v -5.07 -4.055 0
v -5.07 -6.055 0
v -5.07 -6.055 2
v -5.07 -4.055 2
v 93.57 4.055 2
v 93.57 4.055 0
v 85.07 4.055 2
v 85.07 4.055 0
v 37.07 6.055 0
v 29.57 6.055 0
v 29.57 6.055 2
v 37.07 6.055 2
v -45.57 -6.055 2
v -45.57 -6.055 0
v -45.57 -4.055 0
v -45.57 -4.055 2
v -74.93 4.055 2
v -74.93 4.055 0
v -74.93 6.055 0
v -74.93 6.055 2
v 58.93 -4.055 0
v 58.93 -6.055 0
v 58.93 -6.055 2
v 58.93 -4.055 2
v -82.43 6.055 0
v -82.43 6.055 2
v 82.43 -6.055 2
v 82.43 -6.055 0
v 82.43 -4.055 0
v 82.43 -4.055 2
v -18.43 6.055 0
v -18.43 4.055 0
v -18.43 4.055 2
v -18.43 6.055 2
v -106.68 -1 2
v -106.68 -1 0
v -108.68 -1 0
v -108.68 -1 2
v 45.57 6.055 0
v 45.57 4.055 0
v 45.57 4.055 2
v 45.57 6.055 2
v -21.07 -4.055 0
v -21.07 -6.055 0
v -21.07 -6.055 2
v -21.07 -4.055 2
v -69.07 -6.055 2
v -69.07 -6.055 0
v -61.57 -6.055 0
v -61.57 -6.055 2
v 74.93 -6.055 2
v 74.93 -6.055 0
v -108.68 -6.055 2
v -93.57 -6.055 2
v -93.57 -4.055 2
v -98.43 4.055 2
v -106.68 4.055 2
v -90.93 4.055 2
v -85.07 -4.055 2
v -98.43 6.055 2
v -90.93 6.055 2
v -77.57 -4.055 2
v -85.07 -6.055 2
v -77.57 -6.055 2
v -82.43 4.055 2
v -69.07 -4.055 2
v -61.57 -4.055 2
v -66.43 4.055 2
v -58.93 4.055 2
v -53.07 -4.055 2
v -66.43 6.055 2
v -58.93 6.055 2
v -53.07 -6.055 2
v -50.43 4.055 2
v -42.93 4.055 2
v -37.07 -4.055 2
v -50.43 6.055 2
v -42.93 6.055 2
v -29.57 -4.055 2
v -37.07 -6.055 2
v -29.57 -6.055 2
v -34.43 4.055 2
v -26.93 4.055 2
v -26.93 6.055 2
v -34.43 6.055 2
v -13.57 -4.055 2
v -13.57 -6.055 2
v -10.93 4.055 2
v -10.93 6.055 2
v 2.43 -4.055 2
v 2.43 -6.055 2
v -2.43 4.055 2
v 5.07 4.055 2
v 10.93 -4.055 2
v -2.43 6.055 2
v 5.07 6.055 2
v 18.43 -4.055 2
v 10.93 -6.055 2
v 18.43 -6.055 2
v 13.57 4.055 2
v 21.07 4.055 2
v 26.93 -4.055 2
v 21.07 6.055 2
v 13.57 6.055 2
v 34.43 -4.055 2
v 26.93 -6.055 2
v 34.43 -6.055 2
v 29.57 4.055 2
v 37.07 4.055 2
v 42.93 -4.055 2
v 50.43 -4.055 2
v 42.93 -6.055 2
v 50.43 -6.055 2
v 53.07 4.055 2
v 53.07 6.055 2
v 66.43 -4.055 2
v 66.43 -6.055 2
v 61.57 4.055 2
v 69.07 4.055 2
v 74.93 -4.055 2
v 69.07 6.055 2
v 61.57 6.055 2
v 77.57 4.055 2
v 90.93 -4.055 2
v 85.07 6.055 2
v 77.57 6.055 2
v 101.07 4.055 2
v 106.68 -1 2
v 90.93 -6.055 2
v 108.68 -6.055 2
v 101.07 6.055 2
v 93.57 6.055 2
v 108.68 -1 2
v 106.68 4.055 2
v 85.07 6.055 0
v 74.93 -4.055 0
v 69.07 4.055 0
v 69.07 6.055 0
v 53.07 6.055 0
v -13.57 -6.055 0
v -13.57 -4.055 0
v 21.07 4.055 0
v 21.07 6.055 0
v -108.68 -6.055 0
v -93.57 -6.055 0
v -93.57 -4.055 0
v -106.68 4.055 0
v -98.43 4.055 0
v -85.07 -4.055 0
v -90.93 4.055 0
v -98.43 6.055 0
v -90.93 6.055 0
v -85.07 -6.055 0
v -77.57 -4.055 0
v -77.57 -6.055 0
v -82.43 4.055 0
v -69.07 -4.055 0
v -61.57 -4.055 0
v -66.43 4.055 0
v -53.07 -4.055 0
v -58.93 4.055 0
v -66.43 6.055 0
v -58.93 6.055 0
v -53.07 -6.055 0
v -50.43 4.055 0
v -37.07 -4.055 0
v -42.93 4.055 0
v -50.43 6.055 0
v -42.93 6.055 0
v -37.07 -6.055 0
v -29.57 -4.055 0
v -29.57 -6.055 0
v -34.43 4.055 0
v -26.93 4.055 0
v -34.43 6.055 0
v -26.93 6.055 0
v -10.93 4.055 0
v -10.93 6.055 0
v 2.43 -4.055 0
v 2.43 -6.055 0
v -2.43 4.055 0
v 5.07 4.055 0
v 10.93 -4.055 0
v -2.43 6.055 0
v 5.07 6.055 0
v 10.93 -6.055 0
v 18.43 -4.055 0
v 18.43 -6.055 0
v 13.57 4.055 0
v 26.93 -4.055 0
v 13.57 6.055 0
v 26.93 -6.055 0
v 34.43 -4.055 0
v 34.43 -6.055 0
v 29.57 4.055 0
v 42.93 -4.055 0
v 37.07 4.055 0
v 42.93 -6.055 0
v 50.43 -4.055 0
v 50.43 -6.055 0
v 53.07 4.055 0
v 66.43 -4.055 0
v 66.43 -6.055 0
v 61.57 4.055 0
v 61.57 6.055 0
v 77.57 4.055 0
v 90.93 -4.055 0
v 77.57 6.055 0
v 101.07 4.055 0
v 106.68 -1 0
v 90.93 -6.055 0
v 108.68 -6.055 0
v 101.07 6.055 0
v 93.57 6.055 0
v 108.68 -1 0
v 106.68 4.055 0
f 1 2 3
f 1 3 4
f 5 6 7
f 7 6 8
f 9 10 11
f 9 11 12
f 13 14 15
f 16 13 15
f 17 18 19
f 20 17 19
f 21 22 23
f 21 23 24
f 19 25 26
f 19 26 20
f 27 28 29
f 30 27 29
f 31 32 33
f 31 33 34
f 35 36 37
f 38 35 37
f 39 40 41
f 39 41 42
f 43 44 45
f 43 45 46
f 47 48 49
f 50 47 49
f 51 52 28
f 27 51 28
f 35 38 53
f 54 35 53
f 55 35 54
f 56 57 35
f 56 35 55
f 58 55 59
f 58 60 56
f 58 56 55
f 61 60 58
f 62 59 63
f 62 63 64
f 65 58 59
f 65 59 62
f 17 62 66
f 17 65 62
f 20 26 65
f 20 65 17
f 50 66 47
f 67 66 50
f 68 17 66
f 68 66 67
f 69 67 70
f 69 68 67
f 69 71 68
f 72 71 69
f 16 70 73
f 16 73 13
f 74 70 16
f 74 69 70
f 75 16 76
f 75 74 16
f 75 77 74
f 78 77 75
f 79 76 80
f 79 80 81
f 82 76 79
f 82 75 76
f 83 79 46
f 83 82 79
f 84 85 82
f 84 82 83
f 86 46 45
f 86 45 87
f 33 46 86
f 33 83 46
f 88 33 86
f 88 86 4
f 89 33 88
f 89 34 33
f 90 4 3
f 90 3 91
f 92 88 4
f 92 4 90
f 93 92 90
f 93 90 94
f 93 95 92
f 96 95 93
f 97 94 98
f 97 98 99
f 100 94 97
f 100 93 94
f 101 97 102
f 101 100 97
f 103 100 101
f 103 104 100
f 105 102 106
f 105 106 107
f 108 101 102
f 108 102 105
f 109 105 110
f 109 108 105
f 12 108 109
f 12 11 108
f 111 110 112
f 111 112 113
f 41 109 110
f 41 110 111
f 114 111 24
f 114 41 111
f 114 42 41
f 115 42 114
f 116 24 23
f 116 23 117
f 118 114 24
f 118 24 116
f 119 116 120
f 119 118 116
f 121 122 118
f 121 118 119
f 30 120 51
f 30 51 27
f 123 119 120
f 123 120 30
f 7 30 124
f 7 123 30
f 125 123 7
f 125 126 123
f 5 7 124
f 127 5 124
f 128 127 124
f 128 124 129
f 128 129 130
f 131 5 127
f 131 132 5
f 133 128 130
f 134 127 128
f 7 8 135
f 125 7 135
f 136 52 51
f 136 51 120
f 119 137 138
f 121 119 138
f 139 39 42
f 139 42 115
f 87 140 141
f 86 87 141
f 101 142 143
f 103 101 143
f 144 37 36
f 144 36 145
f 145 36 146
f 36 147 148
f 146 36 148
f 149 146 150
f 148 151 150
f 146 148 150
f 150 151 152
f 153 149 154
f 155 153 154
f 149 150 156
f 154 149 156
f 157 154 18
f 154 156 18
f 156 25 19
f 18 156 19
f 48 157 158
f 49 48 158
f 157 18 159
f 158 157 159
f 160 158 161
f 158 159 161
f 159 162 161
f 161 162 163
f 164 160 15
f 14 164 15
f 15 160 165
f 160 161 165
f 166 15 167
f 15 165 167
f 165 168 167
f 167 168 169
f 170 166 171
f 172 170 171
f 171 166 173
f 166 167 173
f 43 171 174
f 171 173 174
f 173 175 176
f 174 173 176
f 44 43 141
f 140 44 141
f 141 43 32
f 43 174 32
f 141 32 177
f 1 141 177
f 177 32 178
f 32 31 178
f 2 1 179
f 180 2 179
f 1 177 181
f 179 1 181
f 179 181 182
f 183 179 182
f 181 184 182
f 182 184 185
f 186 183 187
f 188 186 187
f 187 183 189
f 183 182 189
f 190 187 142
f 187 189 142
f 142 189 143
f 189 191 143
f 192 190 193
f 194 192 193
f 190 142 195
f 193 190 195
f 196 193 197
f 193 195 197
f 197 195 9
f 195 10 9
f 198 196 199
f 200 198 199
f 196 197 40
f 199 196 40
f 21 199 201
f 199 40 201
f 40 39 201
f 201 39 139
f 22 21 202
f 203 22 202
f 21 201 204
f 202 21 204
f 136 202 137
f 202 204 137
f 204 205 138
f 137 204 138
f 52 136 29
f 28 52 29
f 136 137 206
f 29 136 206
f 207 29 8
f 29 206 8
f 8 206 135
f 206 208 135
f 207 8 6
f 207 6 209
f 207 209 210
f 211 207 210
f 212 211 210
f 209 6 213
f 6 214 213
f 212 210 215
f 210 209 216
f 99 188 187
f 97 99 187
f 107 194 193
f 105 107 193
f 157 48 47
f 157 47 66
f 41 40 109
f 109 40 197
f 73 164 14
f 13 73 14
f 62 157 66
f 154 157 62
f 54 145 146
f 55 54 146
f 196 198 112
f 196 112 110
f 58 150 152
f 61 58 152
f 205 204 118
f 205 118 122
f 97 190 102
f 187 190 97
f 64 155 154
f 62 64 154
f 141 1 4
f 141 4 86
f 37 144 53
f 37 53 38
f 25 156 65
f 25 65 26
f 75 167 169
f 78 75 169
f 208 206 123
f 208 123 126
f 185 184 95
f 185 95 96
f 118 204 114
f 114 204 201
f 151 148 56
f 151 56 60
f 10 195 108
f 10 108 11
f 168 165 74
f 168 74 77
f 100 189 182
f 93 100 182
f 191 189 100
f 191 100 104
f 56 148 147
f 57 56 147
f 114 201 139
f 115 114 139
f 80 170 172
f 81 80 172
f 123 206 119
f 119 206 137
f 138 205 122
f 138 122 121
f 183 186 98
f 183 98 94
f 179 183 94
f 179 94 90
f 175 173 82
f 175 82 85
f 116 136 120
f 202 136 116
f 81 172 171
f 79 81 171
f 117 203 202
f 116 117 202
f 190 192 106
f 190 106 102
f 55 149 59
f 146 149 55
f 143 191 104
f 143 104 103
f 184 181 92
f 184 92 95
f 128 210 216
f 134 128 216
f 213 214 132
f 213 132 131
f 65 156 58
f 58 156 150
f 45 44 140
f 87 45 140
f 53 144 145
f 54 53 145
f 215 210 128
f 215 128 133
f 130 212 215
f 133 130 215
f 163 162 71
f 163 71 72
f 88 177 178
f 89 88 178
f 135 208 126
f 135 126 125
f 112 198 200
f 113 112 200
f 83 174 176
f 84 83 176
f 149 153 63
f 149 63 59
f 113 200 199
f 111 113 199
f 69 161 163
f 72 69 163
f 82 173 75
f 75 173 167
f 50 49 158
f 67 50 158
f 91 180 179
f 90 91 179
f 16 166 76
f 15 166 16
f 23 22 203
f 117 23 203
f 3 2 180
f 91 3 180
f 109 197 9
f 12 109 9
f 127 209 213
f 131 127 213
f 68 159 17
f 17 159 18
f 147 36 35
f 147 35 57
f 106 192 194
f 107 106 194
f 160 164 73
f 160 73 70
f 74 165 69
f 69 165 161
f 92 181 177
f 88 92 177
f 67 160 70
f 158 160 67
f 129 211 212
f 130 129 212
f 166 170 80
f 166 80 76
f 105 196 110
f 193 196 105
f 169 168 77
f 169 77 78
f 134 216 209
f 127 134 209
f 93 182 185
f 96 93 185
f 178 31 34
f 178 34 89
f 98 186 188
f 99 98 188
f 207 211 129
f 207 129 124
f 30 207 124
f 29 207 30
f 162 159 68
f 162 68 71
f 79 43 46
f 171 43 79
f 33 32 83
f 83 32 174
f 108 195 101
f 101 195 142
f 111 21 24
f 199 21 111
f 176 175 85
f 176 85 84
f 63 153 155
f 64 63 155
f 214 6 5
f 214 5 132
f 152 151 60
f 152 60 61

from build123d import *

# Parameters (mm, degrees)
ESQUISSE1_W             = 217.36
ESQUISSE1_H             = 12.11
BOSS_EXTRU_1_DEPTH      = 2
ESQUISSE2_W             = 8.5
ESQUISSE2_H             = 2.25
ESQUISSE2_W_2           = 10.5
ENL_V_MAT_EXTRU_1_DEPTH = 109.866916118
ESQUISSE4_W             = 2
ESQUISSE4_H             = 5.055
ENL_V_MAT_EXTRU_2_DEPTH = 109.866916118


with BuildPart() as part:
    # Esquisse1 → Boss.-Extru.1 (new body)
    with BuildSketch(Plane.XY):
        Rectangle(ESQUISSE1_W, ESQUISSE1_H)
    extrude(amount=BOSS_EXTRU_1_DEPTH)

    # Esquisse2 → Enlèv. mat.-Extru.1 (cut, through all)
    with BuildSketch(Plane(origin=(0, 0, 0), x_dir=(-1, 0, 0), z_dir=(0, 0, -1))):
        with Locations((-105.32, 5.18)):
            Rectangle(ESQUISSE2_W, ESQUISSE2_H)
        with Locations((-89.32, 5.18)):
            Rectangle(ESQUISSE2_W, ESQUISSE2_H)
        with Locations((-73.32, 5.18)):
            Rectangle(ESQUISSE2_W, ESQUISSE2_H)
        with Locations((-57.32, 5.18)):
            Rectangle(ESQUISSE2_W, ESQUISSE2_H)
        with Locations((-41.32, 5.18)):
            Rectangle(ESQUISSE2_W, ESQUISSE2_H)
        with Locations((-25.32, 5.18)):
            Rectangle(ESQUISSE2_W, ESQUISSE2_H)
        with Locations((-9.32, 5.18)):
            Rectangle(ESQUISSE2_W, ESQUISSE2_H)
        with Locations((6.68, 5.18)):
            Rectangle(ESQUISSE2_W, ESQUISSE2_H)
        with Locations((22.68, 5.18)):
            Rectangle(ESQUISSE2_W, ESQUISSE2_H)
        with Locations((38.68, 5.18)):
            Rectangle(ESQUISSE2_W, ESQUISSE2_H)
        with Locations((54.68, 5.18)):
            Rectangle(ESQUISSE2_W, ESQUISSE2_H)
        with Locations((70.68, 5.18)):
            Rectangle(ESQUISSE2_W, ESQUISSE2_H)
        with Locations((86.68, 5.18)):
            Rectangle(ESQUISSE2_W, ESQUISSE2_H)
        with Locations((103.68, 5.18)):
            Rectangle(ESQUISSE2_W_2, ESQUISSE2_H)
        with Locations((-86.68, -5.18)):
            Rectangle(ESQUISSE2_W, ESQUISSE2_H)
        with Locations((-70.68, -5.18)):
            Rectangle(ESQUISSE2_W, ESQUISSE2_H)
        with Locations((-54.68, -5.18)):
            Rectangle(ESQUISSE2_W, ESQUISSE2_H)
        with Locations((-38.68, -5.18)):
            Rectangle(ESQUISSE2_W, ESQUISSE2_H)
        with Locations((-22.68, -5.18)):
            Rectangle(ESQUISSE2_W, ESQUISSE2_H)
        with Locations((-6.68, -5.18)):
            Rectangle(ESQUISSE2_W, ESQUISSE2_H)
        with Locations((9.32, -5.18)):
            Rectangle(ESQUISSE2_W, ESQUISSE2_H)
        with Locations((25.32, -5.18)):
            Rectangle(ESQUISSE2_W, ESQUISSE2_H)
        with Locations((41.32, -5.18)):
            Rectangle(ESQUISSE2_W, ESQUISSE2_H)
        with Locations((57.32, -5.18)):
            Rectangle(ESQUISSE2_W, ESQUISSE2_H)
        with Locations((73.32, -5.18)):
            Rectangle(ESQUISSE2_W, ESQUISSE2_H)
        with Locations((89.32, -5.18)):
            Rectangle(ESQUISSE2_W, ESQUISSE2_H)
    extrude(amount=-ENL_V_MAT_EXTRU_1_DEPTH, mode=Mode.SUBTRACT)

    # Esquisse4 → Enlèv. mat.-Extru.2 (cut, through all)
    with BuildSketch(Plane(origin=(0, 0, 0), x_dir=(-1, 0, 0), z_dir=(0, 0, -1))):
        with Locations((107.68, 1.5275)):
            Rectangle(ESQUISSE4_W, ESQUISSE4_H)
    enl_v_mat_extru_2 = extrude(amount=-ENL_V_MAT_EXTRU_2_DEPTH, mode=Mode.SUBTRACT)

    # Symétrie1: Enlèv. mat.-Extru.2 across plane
    add(enl_v_mat_extru_2.mirror(Plane(origin=(0, 0, 0), x_dir=(0, 0, 1), z_dir=(1, 0, 0))), mode=Mode.SUBTRACT)


solid = part.part
